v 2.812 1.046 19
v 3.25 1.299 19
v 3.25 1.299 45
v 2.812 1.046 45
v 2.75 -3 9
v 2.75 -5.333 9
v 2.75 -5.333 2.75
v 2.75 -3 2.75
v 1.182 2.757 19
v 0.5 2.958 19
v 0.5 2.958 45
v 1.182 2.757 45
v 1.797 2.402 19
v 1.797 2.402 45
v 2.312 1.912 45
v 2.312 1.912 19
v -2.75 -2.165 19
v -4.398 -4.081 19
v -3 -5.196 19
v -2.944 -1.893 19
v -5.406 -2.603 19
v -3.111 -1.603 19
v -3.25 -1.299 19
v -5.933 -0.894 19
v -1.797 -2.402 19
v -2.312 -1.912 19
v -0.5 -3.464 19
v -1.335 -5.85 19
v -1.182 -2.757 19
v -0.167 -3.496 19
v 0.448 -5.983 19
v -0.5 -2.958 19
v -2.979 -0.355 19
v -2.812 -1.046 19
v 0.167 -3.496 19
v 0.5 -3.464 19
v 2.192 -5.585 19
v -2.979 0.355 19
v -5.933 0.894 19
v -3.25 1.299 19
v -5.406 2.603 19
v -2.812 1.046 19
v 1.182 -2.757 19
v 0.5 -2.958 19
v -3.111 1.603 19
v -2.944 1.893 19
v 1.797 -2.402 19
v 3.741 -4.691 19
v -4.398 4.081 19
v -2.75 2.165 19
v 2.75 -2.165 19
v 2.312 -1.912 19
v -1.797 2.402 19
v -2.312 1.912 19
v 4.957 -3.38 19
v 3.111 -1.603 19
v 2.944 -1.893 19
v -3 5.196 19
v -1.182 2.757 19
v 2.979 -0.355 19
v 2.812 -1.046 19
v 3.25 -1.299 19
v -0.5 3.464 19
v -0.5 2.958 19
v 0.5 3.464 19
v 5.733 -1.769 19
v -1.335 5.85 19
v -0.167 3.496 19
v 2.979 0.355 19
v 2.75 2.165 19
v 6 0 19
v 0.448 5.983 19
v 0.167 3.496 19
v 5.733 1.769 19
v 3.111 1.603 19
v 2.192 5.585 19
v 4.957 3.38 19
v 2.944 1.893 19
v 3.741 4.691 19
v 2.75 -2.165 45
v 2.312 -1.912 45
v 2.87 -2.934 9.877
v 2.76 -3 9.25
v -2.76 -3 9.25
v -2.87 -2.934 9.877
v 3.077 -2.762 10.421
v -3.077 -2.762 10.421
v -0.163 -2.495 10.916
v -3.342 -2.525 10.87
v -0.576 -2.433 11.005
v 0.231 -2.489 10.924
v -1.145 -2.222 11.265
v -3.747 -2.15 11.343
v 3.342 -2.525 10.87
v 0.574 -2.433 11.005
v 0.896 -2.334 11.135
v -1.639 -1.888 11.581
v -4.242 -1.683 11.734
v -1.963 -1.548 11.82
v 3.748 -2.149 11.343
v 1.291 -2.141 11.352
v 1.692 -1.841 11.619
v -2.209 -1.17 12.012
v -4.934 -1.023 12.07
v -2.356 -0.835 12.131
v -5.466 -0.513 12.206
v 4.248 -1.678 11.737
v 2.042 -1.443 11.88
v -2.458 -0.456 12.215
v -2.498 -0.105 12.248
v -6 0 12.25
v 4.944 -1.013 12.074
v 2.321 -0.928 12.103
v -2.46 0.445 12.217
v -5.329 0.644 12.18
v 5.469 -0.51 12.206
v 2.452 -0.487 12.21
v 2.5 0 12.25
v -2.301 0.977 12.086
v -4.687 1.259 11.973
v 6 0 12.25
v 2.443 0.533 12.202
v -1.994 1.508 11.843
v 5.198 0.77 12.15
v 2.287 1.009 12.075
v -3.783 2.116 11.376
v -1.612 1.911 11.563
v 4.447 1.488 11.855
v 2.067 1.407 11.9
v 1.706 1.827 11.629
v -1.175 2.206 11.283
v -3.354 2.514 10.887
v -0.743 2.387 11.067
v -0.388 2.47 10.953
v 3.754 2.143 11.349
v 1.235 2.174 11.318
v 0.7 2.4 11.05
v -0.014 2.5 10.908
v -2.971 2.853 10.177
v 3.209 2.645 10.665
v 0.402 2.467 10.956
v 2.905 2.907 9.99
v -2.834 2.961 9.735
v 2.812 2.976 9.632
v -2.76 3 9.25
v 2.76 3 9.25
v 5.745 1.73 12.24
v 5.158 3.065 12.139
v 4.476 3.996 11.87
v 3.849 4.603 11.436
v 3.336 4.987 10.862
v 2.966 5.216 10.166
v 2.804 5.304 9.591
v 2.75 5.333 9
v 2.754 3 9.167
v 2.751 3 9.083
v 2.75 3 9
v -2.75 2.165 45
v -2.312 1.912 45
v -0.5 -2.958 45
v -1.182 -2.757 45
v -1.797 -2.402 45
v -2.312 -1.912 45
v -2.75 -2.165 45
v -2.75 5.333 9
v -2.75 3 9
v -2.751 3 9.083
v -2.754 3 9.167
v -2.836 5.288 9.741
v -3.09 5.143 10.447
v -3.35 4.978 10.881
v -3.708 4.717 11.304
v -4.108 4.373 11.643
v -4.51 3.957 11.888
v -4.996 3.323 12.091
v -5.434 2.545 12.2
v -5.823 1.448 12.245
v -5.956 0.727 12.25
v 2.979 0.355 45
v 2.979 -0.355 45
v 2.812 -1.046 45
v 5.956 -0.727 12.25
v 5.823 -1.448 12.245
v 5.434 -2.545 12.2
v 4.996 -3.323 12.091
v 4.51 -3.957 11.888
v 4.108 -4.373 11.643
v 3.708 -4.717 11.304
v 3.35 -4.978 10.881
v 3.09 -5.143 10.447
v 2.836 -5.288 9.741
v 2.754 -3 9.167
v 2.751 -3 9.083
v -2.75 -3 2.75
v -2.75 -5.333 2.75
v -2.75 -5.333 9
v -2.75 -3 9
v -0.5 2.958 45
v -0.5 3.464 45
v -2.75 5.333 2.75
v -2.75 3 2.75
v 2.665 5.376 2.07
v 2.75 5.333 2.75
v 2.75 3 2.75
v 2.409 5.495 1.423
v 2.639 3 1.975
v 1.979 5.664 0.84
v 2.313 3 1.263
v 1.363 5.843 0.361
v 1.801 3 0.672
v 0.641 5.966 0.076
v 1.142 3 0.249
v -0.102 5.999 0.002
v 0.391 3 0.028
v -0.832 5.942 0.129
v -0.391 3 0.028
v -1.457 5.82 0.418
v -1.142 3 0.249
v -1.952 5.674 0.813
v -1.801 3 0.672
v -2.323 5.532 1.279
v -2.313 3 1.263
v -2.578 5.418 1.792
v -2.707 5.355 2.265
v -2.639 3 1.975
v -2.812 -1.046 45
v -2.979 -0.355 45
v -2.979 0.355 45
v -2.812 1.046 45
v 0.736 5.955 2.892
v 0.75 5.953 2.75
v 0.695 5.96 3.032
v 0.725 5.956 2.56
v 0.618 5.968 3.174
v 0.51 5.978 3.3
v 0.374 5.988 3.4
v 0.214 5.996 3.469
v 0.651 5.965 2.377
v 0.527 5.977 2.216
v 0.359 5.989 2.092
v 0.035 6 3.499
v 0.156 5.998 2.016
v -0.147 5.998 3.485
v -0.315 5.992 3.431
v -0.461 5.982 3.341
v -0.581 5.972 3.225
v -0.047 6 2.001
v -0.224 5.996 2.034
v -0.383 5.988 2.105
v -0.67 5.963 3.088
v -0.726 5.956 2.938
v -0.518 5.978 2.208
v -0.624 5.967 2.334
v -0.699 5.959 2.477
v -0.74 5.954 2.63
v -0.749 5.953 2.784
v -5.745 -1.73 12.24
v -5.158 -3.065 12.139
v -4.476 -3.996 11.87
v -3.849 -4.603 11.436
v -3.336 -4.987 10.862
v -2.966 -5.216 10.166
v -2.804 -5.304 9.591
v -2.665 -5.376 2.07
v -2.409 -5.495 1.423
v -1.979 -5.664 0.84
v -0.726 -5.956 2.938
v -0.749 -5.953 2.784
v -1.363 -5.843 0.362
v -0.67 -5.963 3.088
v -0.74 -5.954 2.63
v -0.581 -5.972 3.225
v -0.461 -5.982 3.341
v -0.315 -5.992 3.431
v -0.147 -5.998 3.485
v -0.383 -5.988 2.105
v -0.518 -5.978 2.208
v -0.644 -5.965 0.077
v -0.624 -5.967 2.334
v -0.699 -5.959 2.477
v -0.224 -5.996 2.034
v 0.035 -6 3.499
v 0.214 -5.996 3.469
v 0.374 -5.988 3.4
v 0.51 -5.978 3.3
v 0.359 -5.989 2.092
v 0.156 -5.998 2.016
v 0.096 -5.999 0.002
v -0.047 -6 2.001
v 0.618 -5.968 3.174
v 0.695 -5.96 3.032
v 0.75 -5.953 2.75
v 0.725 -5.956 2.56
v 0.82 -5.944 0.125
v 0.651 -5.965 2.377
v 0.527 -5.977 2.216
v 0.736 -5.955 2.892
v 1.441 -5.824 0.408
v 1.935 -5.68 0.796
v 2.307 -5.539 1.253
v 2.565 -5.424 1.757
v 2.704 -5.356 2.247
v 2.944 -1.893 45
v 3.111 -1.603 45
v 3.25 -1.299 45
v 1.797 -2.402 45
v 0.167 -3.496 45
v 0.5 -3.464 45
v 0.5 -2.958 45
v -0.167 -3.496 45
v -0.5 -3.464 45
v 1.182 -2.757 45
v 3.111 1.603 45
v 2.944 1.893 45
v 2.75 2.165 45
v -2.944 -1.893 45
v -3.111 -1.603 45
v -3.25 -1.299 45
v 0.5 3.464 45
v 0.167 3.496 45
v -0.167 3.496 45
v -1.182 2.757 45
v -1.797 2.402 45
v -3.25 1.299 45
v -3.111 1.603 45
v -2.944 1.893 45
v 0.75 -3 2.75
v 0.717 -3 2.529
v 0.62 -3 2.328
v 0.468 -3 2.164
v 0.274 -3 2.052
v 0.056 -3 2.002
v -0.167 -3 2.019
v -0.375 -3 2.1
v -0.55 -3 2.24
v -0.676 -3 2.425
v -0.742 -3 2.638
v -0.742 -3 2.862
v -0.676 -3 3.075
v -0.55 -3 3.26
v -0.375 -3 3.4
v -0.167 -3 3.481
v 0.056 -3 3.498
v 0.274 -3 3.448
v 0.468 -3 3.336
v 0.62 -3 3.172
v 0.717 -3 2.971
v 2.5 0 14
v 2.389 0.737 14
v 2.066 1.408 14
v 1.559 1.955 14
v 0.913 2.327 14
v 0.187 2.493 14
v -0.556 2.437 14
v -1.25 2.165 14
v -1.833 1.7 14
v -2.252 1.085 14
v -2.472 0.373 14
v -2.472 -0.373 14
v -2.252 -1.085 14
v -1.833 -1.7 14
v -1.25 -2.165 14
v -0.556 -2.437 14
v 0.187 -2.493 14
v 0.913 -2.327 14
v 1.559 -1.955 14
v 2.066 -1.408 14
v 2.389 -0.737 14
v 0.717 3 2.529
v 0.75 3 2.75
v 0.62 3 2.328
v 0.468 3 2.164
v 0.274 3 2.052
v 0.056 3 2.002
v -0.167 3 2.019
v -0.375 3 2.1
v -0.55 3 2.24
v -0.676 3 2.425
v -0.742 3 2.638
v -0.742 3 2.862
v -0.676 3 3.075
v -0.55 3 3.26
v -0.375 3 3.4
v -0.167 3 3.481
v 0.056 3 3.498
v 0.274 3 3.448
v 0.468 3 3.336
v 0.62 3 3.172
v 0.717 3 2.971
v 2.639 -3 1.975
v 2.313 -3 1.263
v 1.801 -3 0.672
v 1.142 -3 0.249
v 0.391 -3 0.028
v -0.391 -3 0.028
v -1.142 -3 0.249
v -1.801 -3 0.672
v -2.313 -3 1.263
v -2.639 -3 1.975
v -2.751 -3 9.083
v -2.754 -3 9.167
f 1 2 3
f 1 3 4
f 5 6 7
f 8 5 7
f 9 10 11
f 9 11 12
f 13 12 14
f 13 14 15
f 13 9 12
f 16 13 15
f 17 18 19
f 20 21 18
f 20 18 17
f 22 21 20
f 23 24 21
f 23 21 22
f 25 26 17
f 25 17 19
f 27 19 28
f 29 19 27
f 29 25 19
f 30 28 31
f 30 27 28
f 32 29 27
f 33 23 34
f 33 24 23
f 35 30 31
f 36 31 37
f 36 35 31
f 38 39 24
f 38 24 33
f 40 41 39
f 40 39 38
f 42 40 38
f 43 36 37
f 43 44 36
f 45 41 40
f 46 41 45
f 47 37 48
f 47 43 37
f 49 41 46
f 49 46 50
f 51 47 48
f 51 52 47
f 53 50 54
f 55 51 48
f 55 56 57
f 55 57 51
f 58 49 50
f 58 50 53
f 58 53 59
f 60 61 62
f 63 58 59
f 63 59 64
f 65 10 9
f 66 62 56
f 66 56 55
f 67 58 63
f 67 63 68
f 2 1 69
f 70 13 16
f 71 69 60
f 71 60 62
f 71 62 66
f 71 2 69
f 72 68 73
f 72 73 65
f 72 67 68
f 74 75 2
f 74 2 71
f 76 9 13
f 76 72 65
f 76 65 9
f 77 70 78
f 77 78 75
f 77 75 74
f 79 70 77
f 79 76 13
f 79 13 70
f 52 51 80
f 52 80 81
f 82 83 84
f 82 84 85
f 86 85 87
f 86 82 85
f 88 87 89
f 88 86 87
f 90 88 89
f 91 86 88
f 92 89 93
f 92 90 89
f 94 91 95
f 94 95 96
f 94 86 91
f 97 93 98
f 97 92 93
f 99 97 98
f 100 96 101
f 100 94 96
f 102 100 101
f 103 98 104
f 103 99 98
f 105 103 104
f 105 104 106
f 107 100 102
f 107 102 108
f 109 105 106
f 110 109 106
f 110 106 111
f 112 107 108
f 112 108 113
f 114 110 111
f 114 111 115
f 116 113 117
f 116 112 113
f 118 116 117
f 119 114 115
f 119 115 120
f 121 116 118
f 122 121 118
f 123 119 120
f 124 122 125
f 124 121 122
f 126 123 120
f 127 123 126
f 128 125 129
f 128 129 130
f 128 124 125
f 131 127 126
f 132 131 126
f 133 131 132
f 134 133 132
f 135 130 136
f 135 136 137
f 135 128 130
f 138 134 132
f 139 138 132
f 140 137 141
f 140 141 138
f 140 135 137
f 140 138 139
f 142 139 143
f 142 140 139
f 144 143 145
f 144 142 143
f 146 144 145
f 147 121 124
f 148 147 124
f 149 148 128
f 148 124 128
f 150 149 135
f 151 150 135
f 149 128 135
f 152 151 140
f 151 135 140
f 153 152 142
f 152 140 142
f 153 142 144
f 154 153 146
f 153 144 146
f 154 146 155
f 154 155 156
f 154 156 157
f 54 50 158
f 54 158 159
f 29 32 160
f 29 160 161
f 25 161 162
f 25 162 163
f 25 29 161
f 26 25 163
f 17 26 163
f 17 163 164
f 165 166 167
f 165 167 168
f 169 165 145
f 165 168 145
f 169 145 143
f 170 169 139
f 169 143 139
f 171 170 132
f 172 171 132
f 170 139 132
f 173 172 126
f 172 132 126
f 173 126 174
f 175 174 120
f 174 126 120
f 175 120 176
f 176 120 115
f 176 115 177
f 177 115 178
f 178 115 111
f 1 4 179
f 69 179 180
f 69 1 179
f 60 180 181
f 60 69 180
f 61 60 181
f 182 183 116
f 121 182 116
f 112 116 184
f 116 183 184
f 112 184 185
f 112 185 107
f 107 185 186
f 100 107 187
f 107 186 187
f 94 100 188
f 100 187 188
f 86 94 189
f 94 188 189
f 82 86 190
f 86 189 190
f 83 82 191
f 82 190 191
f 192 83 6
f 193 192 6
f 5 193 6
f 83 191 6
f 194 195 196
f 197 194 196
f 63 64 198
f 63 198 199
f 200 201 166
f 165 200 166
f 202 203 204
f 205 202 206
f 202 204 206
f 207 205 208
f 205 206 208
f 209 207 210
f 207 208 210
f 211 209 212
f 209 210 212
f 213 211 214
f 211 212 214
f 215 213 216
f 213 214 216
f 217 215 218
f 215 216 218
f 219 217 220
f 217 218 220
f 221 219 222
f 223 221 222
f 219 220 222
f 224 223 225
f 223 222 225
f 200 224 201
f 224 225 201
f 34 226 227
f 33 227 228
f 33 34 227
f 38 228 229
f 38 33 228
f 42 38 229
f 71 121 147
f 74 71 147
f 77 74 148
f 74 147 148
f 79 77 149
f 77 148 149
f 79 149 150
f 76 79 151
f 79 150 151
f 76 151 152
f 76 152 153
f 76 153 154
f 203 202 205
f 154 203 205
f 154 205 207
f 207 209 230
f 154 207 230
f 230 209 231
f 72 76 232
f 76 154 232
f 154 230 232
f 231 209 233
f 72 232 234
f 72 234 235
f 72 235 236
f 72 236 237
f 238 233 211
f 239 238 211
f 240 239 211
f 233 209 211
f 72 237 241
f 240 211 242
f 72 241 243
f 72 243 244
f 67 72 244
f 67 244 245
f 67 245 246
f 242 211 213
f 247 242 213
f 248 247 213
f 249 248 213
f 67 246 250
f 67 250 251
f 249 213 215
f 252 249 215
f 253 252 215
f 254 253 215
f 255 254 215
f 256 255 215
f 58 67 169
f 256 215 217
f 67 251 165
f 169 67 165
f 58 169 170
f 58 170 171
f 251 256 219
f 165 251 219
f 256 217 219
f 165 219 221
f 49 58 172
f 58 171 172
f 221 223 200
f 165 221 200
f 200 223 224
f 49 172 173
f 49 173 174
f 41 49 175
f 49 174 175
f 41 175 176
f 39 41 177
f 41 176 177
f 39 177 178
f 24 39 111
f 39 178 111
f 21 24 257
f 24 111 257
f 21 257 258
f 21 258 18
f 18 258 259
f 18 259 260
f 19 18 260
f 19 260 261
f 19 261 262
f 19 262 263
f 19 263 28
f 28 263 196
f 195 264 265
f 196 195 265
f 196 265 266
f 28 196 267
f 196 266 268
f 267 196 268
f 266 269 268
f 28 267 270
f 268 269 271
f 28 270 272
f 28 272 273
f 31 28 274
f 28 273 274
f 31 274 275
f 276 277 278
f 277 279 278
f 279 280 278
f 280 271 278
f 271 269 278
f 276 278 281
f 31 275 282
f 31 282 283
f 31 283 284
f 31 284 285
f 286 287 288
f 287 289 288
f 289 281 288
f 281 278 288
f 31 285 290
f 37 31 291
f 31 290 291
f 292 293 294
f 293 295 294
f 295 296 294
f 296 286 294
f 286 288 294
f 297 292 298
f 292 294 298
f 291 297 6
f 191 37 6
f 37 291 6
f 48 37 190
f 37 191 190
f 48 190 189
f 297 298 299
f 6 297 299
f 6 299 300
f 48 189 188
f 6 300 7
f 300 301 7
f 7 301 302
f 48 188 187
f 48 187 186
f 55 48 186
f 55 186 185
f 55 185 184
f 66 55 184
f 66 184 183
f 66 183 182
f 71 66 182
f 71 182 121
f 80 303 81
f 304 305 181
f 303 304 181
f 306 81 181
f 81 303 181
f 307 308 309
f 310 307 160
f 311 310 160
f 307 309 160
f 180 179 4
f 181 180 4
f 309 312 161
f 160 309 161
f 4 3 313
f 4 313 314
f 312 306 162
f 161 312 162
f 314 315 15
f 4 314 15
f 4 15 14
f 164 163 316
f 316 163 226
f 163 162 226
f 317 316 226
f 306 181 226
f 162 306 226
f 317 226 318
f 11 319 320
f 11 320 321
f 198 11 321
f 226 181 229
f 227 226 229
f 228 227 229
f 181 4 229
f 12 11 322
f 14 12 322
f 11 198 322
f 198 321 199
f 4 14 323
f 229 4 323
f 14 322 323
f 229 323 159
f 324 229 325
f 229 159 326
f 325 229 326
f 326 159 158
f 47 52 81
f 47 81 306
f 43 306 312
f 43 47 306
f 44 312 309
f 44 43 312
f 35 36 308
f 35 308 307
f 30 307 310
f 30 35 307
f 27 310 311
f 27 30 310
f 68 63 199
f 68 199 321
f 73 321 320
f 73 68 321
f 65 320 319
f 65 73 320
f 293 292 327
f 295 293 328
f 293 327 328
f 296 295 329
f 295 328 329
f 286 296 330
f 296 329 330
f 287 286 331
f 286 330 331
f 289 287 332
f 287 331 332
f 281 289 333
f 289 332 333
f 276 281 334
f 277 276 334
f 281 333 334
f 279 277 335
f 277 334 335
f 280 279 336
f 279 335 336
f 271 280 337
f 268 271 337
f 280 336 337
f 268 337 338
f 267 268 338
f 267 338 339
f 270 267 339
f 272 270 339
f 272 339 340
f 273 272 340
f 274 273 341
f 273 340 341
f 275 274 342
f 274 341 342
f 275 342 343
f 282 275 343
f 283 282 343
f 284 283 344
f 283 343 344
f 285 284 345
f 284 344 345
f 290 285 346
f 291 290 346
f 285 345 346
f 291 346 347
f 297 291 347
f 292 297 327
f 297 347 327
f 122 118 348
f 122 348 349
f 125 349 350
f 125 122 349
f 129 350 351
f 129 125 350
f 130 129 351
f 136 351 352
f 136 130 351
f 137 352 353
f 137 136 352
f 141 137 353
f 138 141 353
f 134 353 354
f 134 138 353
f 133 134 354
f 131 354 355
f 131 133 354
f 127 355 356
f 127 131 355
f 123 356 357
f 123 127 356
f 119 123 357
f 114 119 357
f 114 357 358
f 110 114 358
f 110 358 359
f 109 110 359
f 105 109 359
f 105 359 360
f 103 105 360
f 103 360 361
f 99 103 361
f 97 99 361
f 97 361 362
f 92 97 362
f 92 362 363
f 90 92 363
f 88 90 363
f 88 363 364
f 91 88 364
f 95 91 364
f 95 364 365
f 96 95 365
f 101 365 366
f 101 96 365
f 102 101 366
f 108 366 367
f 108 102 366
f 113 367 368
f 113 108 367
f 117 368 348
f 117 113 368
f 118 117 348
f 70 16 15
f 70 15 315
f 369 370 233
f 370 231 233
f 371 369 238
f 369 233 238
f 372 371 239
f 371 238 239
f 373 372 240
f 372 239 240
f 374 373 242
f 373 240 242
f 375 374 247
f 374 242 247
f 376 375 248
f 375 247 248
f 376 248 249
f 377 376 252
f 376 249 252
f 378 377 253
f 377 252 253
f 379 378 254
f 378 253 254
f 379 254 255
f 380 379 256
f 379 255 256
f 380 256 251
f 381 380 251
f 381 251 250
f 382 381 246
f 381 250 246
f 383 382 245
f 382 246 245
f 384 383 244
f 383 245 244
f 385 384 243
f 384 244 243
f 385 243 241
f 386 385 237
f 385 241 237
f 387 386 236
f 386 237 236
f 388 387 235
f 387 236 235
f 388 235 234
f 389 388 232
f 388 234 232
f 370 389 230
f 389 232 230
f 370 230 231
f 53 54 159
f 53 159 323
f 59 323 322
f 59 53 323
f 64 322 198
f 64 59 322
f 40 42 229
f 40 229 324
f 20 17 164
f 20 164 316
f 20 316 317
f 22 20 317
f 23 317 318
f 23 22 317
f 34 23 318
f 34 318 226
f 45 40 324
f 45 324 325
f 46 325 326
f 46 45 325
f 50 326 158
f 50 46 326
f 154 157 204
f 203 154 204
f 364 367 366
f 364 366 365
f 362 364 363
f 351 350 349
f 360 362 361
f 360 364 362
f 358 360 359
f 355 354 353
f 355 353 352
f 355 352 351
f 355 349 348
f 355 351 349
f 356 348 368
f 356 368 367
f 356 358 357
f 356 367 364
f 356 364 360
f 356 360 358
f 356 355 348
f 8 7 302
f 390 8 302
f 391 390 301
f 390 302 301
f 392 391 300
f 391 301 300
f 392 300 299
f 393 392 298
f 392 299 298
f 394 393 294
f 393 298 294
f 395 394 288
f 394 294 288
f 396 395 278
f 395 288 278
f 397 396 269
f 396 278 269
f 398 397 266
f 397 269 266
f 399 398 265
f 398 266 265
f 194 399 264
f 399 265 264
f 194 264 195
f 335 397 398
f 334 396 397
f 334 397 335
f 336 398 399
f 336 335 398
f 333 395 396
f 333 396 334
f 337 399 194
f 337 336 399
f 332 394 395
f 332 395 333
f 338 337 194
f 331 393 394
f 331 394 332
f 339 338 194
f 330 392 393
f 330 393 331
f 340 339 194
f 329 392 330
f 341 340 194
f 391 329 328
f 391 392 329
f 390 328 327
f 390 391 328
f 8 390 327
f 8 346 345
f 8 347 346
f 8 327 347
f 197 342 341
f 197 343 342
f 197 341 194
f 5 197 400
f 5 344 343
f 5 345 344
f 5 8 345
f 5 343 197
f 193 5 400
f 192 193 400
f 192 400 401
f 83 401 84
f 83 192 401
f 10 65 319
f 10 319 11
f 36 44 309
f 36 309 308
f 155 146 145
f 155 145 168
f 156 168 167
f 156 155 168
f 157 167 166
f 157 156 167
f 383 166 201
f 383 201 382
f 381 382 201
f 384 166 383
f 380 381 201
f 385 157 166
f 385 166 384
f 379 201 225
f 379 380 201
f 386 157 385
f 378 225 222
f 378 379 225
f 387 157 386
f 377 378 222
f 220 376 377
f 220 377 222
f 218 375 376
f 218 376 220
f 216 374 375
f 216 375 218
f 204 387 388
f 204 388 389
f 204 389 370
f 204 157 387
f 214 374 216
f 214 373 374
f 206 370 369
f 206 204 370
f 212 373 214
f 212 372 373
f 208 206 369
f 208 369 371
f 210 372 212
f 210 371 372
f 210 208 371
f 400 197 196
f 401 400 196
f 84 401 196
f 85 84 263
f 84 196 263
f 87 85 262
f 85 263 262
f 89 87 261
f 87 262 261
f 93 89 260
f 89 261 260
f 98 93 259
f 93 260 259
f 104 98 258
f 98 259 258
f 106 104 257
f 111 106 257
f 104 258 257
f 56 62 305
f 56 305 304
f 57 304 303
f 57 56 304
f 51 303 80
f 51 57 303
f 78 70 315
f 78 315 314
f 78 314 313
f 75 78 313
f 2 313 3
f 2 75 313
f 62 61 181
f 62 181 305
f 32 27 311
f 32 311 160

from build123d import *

# Parameters (mm, degrees)
SKETCH_1_R          = 6
SKETCH_1_R_2        = 2.5
EXTRUDE_1_DEPTH     = 19
SKETCH_2_OUTSIDE_W  = 19.096
SKETCH_2_OUTSIDE_H  = 26.096
SKETCH_2_OUTSIDE_R  = 0.75
CUT_EXTRUDE_1_DEPTH = 9.5
CUT_EXTRUDE_2_DEPTH = 9.5
EXTRUDE_2_DEPTH     = 31


with BuildPart() as part:
    # 草图1 → 凸台-拉伸1 (new body)
    with BuildSketch(Plane.XY):
        Circle(SKETCH_1_R)
        Circle(SKETCH_1_R_2, mode=Mode.SUBTRACT)
    extrude(amount=EXTRUDE_1_DEPTH)

    # 草图2 outside → 切除-拉伸1 (cut, symmetric)
    with BuildSketch(Plane(origin=(0, 0, 0), x_dir=(1, 0, 0), z_dir=(0, 1, 0))):
        with Locations((0, -9.5)):
            Rectangle(SKETCH_2_OUTSIDE_W, SKETCH_2_OUTSIDE_H)
        with BuildLine():
            Line((-2.75, -2.75), (-2.75, -9))
            ThreePointArc((-2.75, -9), (-3.701902961, -11.298097039), (-6, -12.25))
            Line((-6, -12.25), (-6, -19))
            Line((-6, -19), (6, -19))
            Line((6, -19), (6, -12.25))
            ThreePointArc((6, -12.25), (3.701902961, -11.298097039), (2.75, -9))
            Line((2.75, -9), (2.75, -2.75))
            ThreePointArc((2.75, -2.75), (0, 0), (-2.75, -2.75))
        make_face(mode=Mode.SUBTRACT)
        with Locations((0, -2.75)):
            Circle(SKETCH_2_OUTSIDE_R)
    extrude(amount=CUT_EXTRUDE_1_DEPTH, both=True, mode=Mode.SUBTRACT)

    # 草图3 → 切除-拉伸2 (cut, symmetric)
    with BuildSketch(Plane(origin=(0, 0, 0), x_dir=(0, 0, -1), z_dir=(1, 0, 0))):
        with BuildLine():
            Line((-9.250000001, 3), (0, 3))
            Line((0, 3), (0, -3))
            Line((0, -3), (-9.250000001, -3))
            ThreePointArc((-9.250000001, -3), (-12.250000001, 0), (-9.250000001, 3))
        make_face()
    extrude(amount=CUT_EXTRUDE_2_DEPTH, both=True, mode=Mode.SUBTRACT)

    # 草图5 → 凸台-拉伸2 (add)
    with BuildSketch(Plane(origin=(0, 0, 14), x_dir=(-1, 0, 0), z_dir=(0, 0, -1))):
        with BuildLine():
            Line((-0.5, 3.464101615), (-0.5, 2.958039892))
            ThreePointArc((-0.5, 2.958039892), (-1.5, 2.598076211), (-2.311737691, 1.912032648))
            Line((-2.311737691, 1.912032648), (-2.75, 2.165063509))
            ThreePointArc((-2.75, 2.165063509), (-3.031088913, 1.75), (-3.25, 1.299038106))
            Line((-3.25, 1.299038106), (-2.811737691, 1.046007244))
            ThreePointArc((-2.811737691, 1.046007244), (-3, 0), (-2.811737691, -1.046007244))
            Line((-2.811737691, -1.046007244), (-3.25, -1.299038106))
            ThreePointArc((-3.25, -1.299038106), (-3.031088913, -1.75), (-2.75, -2.165063509))
            Line((-2.75, -2.165063509), (-2.311737691, -1.912032648))
            ThreePointArc((-2.311737691, -1.912032648), (-1.5, -2.598076211), (-0.5, -2.958039892))
            Line((-0.5, -2.958039892), (-0.5, -3.464101615))
            ThreePointArc((-0.5, -3.464101615), (0, -3.5), (0.5, -3.464101615))
            Line((0.5, -3.464101615), (0.5, -2.958039892))
            ThreePointArc((0.5, -2.958039892), (1.5, -2.598076211), (2.311737691, -1.912032648))
            Line((2.311737691, -1.912032648), (2.75, -2.165063509))
            ThreePointArc((2.75, -2.165063509), (3.031088913, -1.75), (3.25, -1.299038106))
            Line((3.25, -1.299038106), (2.811737691, -1.046007244))
            ThreePointArc((2.811737691, -1.046007244), (3, 0), (2.811737691, 1.046007244))
            Line((2.811737691, 1.046007244), (3.25, 1.299038106))
            ThreePointArc((3.25, 1.299038106), (3.031088913, 1.75), (2.75, 2.165063509))
            Line((2.75, 2.165063509), (2.311737691, 1.912032648))
            ThreePointArc((2.311737691, 1.912032648), (1.5, 2.598076211), (0.5, 2.958039892))
            Line((0.5, 2.958039892), (0.5, 3.464101615))
            ThreePointArc((0.5, 3.464101615), (0, 3.5), (-0.5, 3.464101615))
        make_face()
    extrude(amount=-EXTRUDE_2_DEPTH)


solid = part.part
